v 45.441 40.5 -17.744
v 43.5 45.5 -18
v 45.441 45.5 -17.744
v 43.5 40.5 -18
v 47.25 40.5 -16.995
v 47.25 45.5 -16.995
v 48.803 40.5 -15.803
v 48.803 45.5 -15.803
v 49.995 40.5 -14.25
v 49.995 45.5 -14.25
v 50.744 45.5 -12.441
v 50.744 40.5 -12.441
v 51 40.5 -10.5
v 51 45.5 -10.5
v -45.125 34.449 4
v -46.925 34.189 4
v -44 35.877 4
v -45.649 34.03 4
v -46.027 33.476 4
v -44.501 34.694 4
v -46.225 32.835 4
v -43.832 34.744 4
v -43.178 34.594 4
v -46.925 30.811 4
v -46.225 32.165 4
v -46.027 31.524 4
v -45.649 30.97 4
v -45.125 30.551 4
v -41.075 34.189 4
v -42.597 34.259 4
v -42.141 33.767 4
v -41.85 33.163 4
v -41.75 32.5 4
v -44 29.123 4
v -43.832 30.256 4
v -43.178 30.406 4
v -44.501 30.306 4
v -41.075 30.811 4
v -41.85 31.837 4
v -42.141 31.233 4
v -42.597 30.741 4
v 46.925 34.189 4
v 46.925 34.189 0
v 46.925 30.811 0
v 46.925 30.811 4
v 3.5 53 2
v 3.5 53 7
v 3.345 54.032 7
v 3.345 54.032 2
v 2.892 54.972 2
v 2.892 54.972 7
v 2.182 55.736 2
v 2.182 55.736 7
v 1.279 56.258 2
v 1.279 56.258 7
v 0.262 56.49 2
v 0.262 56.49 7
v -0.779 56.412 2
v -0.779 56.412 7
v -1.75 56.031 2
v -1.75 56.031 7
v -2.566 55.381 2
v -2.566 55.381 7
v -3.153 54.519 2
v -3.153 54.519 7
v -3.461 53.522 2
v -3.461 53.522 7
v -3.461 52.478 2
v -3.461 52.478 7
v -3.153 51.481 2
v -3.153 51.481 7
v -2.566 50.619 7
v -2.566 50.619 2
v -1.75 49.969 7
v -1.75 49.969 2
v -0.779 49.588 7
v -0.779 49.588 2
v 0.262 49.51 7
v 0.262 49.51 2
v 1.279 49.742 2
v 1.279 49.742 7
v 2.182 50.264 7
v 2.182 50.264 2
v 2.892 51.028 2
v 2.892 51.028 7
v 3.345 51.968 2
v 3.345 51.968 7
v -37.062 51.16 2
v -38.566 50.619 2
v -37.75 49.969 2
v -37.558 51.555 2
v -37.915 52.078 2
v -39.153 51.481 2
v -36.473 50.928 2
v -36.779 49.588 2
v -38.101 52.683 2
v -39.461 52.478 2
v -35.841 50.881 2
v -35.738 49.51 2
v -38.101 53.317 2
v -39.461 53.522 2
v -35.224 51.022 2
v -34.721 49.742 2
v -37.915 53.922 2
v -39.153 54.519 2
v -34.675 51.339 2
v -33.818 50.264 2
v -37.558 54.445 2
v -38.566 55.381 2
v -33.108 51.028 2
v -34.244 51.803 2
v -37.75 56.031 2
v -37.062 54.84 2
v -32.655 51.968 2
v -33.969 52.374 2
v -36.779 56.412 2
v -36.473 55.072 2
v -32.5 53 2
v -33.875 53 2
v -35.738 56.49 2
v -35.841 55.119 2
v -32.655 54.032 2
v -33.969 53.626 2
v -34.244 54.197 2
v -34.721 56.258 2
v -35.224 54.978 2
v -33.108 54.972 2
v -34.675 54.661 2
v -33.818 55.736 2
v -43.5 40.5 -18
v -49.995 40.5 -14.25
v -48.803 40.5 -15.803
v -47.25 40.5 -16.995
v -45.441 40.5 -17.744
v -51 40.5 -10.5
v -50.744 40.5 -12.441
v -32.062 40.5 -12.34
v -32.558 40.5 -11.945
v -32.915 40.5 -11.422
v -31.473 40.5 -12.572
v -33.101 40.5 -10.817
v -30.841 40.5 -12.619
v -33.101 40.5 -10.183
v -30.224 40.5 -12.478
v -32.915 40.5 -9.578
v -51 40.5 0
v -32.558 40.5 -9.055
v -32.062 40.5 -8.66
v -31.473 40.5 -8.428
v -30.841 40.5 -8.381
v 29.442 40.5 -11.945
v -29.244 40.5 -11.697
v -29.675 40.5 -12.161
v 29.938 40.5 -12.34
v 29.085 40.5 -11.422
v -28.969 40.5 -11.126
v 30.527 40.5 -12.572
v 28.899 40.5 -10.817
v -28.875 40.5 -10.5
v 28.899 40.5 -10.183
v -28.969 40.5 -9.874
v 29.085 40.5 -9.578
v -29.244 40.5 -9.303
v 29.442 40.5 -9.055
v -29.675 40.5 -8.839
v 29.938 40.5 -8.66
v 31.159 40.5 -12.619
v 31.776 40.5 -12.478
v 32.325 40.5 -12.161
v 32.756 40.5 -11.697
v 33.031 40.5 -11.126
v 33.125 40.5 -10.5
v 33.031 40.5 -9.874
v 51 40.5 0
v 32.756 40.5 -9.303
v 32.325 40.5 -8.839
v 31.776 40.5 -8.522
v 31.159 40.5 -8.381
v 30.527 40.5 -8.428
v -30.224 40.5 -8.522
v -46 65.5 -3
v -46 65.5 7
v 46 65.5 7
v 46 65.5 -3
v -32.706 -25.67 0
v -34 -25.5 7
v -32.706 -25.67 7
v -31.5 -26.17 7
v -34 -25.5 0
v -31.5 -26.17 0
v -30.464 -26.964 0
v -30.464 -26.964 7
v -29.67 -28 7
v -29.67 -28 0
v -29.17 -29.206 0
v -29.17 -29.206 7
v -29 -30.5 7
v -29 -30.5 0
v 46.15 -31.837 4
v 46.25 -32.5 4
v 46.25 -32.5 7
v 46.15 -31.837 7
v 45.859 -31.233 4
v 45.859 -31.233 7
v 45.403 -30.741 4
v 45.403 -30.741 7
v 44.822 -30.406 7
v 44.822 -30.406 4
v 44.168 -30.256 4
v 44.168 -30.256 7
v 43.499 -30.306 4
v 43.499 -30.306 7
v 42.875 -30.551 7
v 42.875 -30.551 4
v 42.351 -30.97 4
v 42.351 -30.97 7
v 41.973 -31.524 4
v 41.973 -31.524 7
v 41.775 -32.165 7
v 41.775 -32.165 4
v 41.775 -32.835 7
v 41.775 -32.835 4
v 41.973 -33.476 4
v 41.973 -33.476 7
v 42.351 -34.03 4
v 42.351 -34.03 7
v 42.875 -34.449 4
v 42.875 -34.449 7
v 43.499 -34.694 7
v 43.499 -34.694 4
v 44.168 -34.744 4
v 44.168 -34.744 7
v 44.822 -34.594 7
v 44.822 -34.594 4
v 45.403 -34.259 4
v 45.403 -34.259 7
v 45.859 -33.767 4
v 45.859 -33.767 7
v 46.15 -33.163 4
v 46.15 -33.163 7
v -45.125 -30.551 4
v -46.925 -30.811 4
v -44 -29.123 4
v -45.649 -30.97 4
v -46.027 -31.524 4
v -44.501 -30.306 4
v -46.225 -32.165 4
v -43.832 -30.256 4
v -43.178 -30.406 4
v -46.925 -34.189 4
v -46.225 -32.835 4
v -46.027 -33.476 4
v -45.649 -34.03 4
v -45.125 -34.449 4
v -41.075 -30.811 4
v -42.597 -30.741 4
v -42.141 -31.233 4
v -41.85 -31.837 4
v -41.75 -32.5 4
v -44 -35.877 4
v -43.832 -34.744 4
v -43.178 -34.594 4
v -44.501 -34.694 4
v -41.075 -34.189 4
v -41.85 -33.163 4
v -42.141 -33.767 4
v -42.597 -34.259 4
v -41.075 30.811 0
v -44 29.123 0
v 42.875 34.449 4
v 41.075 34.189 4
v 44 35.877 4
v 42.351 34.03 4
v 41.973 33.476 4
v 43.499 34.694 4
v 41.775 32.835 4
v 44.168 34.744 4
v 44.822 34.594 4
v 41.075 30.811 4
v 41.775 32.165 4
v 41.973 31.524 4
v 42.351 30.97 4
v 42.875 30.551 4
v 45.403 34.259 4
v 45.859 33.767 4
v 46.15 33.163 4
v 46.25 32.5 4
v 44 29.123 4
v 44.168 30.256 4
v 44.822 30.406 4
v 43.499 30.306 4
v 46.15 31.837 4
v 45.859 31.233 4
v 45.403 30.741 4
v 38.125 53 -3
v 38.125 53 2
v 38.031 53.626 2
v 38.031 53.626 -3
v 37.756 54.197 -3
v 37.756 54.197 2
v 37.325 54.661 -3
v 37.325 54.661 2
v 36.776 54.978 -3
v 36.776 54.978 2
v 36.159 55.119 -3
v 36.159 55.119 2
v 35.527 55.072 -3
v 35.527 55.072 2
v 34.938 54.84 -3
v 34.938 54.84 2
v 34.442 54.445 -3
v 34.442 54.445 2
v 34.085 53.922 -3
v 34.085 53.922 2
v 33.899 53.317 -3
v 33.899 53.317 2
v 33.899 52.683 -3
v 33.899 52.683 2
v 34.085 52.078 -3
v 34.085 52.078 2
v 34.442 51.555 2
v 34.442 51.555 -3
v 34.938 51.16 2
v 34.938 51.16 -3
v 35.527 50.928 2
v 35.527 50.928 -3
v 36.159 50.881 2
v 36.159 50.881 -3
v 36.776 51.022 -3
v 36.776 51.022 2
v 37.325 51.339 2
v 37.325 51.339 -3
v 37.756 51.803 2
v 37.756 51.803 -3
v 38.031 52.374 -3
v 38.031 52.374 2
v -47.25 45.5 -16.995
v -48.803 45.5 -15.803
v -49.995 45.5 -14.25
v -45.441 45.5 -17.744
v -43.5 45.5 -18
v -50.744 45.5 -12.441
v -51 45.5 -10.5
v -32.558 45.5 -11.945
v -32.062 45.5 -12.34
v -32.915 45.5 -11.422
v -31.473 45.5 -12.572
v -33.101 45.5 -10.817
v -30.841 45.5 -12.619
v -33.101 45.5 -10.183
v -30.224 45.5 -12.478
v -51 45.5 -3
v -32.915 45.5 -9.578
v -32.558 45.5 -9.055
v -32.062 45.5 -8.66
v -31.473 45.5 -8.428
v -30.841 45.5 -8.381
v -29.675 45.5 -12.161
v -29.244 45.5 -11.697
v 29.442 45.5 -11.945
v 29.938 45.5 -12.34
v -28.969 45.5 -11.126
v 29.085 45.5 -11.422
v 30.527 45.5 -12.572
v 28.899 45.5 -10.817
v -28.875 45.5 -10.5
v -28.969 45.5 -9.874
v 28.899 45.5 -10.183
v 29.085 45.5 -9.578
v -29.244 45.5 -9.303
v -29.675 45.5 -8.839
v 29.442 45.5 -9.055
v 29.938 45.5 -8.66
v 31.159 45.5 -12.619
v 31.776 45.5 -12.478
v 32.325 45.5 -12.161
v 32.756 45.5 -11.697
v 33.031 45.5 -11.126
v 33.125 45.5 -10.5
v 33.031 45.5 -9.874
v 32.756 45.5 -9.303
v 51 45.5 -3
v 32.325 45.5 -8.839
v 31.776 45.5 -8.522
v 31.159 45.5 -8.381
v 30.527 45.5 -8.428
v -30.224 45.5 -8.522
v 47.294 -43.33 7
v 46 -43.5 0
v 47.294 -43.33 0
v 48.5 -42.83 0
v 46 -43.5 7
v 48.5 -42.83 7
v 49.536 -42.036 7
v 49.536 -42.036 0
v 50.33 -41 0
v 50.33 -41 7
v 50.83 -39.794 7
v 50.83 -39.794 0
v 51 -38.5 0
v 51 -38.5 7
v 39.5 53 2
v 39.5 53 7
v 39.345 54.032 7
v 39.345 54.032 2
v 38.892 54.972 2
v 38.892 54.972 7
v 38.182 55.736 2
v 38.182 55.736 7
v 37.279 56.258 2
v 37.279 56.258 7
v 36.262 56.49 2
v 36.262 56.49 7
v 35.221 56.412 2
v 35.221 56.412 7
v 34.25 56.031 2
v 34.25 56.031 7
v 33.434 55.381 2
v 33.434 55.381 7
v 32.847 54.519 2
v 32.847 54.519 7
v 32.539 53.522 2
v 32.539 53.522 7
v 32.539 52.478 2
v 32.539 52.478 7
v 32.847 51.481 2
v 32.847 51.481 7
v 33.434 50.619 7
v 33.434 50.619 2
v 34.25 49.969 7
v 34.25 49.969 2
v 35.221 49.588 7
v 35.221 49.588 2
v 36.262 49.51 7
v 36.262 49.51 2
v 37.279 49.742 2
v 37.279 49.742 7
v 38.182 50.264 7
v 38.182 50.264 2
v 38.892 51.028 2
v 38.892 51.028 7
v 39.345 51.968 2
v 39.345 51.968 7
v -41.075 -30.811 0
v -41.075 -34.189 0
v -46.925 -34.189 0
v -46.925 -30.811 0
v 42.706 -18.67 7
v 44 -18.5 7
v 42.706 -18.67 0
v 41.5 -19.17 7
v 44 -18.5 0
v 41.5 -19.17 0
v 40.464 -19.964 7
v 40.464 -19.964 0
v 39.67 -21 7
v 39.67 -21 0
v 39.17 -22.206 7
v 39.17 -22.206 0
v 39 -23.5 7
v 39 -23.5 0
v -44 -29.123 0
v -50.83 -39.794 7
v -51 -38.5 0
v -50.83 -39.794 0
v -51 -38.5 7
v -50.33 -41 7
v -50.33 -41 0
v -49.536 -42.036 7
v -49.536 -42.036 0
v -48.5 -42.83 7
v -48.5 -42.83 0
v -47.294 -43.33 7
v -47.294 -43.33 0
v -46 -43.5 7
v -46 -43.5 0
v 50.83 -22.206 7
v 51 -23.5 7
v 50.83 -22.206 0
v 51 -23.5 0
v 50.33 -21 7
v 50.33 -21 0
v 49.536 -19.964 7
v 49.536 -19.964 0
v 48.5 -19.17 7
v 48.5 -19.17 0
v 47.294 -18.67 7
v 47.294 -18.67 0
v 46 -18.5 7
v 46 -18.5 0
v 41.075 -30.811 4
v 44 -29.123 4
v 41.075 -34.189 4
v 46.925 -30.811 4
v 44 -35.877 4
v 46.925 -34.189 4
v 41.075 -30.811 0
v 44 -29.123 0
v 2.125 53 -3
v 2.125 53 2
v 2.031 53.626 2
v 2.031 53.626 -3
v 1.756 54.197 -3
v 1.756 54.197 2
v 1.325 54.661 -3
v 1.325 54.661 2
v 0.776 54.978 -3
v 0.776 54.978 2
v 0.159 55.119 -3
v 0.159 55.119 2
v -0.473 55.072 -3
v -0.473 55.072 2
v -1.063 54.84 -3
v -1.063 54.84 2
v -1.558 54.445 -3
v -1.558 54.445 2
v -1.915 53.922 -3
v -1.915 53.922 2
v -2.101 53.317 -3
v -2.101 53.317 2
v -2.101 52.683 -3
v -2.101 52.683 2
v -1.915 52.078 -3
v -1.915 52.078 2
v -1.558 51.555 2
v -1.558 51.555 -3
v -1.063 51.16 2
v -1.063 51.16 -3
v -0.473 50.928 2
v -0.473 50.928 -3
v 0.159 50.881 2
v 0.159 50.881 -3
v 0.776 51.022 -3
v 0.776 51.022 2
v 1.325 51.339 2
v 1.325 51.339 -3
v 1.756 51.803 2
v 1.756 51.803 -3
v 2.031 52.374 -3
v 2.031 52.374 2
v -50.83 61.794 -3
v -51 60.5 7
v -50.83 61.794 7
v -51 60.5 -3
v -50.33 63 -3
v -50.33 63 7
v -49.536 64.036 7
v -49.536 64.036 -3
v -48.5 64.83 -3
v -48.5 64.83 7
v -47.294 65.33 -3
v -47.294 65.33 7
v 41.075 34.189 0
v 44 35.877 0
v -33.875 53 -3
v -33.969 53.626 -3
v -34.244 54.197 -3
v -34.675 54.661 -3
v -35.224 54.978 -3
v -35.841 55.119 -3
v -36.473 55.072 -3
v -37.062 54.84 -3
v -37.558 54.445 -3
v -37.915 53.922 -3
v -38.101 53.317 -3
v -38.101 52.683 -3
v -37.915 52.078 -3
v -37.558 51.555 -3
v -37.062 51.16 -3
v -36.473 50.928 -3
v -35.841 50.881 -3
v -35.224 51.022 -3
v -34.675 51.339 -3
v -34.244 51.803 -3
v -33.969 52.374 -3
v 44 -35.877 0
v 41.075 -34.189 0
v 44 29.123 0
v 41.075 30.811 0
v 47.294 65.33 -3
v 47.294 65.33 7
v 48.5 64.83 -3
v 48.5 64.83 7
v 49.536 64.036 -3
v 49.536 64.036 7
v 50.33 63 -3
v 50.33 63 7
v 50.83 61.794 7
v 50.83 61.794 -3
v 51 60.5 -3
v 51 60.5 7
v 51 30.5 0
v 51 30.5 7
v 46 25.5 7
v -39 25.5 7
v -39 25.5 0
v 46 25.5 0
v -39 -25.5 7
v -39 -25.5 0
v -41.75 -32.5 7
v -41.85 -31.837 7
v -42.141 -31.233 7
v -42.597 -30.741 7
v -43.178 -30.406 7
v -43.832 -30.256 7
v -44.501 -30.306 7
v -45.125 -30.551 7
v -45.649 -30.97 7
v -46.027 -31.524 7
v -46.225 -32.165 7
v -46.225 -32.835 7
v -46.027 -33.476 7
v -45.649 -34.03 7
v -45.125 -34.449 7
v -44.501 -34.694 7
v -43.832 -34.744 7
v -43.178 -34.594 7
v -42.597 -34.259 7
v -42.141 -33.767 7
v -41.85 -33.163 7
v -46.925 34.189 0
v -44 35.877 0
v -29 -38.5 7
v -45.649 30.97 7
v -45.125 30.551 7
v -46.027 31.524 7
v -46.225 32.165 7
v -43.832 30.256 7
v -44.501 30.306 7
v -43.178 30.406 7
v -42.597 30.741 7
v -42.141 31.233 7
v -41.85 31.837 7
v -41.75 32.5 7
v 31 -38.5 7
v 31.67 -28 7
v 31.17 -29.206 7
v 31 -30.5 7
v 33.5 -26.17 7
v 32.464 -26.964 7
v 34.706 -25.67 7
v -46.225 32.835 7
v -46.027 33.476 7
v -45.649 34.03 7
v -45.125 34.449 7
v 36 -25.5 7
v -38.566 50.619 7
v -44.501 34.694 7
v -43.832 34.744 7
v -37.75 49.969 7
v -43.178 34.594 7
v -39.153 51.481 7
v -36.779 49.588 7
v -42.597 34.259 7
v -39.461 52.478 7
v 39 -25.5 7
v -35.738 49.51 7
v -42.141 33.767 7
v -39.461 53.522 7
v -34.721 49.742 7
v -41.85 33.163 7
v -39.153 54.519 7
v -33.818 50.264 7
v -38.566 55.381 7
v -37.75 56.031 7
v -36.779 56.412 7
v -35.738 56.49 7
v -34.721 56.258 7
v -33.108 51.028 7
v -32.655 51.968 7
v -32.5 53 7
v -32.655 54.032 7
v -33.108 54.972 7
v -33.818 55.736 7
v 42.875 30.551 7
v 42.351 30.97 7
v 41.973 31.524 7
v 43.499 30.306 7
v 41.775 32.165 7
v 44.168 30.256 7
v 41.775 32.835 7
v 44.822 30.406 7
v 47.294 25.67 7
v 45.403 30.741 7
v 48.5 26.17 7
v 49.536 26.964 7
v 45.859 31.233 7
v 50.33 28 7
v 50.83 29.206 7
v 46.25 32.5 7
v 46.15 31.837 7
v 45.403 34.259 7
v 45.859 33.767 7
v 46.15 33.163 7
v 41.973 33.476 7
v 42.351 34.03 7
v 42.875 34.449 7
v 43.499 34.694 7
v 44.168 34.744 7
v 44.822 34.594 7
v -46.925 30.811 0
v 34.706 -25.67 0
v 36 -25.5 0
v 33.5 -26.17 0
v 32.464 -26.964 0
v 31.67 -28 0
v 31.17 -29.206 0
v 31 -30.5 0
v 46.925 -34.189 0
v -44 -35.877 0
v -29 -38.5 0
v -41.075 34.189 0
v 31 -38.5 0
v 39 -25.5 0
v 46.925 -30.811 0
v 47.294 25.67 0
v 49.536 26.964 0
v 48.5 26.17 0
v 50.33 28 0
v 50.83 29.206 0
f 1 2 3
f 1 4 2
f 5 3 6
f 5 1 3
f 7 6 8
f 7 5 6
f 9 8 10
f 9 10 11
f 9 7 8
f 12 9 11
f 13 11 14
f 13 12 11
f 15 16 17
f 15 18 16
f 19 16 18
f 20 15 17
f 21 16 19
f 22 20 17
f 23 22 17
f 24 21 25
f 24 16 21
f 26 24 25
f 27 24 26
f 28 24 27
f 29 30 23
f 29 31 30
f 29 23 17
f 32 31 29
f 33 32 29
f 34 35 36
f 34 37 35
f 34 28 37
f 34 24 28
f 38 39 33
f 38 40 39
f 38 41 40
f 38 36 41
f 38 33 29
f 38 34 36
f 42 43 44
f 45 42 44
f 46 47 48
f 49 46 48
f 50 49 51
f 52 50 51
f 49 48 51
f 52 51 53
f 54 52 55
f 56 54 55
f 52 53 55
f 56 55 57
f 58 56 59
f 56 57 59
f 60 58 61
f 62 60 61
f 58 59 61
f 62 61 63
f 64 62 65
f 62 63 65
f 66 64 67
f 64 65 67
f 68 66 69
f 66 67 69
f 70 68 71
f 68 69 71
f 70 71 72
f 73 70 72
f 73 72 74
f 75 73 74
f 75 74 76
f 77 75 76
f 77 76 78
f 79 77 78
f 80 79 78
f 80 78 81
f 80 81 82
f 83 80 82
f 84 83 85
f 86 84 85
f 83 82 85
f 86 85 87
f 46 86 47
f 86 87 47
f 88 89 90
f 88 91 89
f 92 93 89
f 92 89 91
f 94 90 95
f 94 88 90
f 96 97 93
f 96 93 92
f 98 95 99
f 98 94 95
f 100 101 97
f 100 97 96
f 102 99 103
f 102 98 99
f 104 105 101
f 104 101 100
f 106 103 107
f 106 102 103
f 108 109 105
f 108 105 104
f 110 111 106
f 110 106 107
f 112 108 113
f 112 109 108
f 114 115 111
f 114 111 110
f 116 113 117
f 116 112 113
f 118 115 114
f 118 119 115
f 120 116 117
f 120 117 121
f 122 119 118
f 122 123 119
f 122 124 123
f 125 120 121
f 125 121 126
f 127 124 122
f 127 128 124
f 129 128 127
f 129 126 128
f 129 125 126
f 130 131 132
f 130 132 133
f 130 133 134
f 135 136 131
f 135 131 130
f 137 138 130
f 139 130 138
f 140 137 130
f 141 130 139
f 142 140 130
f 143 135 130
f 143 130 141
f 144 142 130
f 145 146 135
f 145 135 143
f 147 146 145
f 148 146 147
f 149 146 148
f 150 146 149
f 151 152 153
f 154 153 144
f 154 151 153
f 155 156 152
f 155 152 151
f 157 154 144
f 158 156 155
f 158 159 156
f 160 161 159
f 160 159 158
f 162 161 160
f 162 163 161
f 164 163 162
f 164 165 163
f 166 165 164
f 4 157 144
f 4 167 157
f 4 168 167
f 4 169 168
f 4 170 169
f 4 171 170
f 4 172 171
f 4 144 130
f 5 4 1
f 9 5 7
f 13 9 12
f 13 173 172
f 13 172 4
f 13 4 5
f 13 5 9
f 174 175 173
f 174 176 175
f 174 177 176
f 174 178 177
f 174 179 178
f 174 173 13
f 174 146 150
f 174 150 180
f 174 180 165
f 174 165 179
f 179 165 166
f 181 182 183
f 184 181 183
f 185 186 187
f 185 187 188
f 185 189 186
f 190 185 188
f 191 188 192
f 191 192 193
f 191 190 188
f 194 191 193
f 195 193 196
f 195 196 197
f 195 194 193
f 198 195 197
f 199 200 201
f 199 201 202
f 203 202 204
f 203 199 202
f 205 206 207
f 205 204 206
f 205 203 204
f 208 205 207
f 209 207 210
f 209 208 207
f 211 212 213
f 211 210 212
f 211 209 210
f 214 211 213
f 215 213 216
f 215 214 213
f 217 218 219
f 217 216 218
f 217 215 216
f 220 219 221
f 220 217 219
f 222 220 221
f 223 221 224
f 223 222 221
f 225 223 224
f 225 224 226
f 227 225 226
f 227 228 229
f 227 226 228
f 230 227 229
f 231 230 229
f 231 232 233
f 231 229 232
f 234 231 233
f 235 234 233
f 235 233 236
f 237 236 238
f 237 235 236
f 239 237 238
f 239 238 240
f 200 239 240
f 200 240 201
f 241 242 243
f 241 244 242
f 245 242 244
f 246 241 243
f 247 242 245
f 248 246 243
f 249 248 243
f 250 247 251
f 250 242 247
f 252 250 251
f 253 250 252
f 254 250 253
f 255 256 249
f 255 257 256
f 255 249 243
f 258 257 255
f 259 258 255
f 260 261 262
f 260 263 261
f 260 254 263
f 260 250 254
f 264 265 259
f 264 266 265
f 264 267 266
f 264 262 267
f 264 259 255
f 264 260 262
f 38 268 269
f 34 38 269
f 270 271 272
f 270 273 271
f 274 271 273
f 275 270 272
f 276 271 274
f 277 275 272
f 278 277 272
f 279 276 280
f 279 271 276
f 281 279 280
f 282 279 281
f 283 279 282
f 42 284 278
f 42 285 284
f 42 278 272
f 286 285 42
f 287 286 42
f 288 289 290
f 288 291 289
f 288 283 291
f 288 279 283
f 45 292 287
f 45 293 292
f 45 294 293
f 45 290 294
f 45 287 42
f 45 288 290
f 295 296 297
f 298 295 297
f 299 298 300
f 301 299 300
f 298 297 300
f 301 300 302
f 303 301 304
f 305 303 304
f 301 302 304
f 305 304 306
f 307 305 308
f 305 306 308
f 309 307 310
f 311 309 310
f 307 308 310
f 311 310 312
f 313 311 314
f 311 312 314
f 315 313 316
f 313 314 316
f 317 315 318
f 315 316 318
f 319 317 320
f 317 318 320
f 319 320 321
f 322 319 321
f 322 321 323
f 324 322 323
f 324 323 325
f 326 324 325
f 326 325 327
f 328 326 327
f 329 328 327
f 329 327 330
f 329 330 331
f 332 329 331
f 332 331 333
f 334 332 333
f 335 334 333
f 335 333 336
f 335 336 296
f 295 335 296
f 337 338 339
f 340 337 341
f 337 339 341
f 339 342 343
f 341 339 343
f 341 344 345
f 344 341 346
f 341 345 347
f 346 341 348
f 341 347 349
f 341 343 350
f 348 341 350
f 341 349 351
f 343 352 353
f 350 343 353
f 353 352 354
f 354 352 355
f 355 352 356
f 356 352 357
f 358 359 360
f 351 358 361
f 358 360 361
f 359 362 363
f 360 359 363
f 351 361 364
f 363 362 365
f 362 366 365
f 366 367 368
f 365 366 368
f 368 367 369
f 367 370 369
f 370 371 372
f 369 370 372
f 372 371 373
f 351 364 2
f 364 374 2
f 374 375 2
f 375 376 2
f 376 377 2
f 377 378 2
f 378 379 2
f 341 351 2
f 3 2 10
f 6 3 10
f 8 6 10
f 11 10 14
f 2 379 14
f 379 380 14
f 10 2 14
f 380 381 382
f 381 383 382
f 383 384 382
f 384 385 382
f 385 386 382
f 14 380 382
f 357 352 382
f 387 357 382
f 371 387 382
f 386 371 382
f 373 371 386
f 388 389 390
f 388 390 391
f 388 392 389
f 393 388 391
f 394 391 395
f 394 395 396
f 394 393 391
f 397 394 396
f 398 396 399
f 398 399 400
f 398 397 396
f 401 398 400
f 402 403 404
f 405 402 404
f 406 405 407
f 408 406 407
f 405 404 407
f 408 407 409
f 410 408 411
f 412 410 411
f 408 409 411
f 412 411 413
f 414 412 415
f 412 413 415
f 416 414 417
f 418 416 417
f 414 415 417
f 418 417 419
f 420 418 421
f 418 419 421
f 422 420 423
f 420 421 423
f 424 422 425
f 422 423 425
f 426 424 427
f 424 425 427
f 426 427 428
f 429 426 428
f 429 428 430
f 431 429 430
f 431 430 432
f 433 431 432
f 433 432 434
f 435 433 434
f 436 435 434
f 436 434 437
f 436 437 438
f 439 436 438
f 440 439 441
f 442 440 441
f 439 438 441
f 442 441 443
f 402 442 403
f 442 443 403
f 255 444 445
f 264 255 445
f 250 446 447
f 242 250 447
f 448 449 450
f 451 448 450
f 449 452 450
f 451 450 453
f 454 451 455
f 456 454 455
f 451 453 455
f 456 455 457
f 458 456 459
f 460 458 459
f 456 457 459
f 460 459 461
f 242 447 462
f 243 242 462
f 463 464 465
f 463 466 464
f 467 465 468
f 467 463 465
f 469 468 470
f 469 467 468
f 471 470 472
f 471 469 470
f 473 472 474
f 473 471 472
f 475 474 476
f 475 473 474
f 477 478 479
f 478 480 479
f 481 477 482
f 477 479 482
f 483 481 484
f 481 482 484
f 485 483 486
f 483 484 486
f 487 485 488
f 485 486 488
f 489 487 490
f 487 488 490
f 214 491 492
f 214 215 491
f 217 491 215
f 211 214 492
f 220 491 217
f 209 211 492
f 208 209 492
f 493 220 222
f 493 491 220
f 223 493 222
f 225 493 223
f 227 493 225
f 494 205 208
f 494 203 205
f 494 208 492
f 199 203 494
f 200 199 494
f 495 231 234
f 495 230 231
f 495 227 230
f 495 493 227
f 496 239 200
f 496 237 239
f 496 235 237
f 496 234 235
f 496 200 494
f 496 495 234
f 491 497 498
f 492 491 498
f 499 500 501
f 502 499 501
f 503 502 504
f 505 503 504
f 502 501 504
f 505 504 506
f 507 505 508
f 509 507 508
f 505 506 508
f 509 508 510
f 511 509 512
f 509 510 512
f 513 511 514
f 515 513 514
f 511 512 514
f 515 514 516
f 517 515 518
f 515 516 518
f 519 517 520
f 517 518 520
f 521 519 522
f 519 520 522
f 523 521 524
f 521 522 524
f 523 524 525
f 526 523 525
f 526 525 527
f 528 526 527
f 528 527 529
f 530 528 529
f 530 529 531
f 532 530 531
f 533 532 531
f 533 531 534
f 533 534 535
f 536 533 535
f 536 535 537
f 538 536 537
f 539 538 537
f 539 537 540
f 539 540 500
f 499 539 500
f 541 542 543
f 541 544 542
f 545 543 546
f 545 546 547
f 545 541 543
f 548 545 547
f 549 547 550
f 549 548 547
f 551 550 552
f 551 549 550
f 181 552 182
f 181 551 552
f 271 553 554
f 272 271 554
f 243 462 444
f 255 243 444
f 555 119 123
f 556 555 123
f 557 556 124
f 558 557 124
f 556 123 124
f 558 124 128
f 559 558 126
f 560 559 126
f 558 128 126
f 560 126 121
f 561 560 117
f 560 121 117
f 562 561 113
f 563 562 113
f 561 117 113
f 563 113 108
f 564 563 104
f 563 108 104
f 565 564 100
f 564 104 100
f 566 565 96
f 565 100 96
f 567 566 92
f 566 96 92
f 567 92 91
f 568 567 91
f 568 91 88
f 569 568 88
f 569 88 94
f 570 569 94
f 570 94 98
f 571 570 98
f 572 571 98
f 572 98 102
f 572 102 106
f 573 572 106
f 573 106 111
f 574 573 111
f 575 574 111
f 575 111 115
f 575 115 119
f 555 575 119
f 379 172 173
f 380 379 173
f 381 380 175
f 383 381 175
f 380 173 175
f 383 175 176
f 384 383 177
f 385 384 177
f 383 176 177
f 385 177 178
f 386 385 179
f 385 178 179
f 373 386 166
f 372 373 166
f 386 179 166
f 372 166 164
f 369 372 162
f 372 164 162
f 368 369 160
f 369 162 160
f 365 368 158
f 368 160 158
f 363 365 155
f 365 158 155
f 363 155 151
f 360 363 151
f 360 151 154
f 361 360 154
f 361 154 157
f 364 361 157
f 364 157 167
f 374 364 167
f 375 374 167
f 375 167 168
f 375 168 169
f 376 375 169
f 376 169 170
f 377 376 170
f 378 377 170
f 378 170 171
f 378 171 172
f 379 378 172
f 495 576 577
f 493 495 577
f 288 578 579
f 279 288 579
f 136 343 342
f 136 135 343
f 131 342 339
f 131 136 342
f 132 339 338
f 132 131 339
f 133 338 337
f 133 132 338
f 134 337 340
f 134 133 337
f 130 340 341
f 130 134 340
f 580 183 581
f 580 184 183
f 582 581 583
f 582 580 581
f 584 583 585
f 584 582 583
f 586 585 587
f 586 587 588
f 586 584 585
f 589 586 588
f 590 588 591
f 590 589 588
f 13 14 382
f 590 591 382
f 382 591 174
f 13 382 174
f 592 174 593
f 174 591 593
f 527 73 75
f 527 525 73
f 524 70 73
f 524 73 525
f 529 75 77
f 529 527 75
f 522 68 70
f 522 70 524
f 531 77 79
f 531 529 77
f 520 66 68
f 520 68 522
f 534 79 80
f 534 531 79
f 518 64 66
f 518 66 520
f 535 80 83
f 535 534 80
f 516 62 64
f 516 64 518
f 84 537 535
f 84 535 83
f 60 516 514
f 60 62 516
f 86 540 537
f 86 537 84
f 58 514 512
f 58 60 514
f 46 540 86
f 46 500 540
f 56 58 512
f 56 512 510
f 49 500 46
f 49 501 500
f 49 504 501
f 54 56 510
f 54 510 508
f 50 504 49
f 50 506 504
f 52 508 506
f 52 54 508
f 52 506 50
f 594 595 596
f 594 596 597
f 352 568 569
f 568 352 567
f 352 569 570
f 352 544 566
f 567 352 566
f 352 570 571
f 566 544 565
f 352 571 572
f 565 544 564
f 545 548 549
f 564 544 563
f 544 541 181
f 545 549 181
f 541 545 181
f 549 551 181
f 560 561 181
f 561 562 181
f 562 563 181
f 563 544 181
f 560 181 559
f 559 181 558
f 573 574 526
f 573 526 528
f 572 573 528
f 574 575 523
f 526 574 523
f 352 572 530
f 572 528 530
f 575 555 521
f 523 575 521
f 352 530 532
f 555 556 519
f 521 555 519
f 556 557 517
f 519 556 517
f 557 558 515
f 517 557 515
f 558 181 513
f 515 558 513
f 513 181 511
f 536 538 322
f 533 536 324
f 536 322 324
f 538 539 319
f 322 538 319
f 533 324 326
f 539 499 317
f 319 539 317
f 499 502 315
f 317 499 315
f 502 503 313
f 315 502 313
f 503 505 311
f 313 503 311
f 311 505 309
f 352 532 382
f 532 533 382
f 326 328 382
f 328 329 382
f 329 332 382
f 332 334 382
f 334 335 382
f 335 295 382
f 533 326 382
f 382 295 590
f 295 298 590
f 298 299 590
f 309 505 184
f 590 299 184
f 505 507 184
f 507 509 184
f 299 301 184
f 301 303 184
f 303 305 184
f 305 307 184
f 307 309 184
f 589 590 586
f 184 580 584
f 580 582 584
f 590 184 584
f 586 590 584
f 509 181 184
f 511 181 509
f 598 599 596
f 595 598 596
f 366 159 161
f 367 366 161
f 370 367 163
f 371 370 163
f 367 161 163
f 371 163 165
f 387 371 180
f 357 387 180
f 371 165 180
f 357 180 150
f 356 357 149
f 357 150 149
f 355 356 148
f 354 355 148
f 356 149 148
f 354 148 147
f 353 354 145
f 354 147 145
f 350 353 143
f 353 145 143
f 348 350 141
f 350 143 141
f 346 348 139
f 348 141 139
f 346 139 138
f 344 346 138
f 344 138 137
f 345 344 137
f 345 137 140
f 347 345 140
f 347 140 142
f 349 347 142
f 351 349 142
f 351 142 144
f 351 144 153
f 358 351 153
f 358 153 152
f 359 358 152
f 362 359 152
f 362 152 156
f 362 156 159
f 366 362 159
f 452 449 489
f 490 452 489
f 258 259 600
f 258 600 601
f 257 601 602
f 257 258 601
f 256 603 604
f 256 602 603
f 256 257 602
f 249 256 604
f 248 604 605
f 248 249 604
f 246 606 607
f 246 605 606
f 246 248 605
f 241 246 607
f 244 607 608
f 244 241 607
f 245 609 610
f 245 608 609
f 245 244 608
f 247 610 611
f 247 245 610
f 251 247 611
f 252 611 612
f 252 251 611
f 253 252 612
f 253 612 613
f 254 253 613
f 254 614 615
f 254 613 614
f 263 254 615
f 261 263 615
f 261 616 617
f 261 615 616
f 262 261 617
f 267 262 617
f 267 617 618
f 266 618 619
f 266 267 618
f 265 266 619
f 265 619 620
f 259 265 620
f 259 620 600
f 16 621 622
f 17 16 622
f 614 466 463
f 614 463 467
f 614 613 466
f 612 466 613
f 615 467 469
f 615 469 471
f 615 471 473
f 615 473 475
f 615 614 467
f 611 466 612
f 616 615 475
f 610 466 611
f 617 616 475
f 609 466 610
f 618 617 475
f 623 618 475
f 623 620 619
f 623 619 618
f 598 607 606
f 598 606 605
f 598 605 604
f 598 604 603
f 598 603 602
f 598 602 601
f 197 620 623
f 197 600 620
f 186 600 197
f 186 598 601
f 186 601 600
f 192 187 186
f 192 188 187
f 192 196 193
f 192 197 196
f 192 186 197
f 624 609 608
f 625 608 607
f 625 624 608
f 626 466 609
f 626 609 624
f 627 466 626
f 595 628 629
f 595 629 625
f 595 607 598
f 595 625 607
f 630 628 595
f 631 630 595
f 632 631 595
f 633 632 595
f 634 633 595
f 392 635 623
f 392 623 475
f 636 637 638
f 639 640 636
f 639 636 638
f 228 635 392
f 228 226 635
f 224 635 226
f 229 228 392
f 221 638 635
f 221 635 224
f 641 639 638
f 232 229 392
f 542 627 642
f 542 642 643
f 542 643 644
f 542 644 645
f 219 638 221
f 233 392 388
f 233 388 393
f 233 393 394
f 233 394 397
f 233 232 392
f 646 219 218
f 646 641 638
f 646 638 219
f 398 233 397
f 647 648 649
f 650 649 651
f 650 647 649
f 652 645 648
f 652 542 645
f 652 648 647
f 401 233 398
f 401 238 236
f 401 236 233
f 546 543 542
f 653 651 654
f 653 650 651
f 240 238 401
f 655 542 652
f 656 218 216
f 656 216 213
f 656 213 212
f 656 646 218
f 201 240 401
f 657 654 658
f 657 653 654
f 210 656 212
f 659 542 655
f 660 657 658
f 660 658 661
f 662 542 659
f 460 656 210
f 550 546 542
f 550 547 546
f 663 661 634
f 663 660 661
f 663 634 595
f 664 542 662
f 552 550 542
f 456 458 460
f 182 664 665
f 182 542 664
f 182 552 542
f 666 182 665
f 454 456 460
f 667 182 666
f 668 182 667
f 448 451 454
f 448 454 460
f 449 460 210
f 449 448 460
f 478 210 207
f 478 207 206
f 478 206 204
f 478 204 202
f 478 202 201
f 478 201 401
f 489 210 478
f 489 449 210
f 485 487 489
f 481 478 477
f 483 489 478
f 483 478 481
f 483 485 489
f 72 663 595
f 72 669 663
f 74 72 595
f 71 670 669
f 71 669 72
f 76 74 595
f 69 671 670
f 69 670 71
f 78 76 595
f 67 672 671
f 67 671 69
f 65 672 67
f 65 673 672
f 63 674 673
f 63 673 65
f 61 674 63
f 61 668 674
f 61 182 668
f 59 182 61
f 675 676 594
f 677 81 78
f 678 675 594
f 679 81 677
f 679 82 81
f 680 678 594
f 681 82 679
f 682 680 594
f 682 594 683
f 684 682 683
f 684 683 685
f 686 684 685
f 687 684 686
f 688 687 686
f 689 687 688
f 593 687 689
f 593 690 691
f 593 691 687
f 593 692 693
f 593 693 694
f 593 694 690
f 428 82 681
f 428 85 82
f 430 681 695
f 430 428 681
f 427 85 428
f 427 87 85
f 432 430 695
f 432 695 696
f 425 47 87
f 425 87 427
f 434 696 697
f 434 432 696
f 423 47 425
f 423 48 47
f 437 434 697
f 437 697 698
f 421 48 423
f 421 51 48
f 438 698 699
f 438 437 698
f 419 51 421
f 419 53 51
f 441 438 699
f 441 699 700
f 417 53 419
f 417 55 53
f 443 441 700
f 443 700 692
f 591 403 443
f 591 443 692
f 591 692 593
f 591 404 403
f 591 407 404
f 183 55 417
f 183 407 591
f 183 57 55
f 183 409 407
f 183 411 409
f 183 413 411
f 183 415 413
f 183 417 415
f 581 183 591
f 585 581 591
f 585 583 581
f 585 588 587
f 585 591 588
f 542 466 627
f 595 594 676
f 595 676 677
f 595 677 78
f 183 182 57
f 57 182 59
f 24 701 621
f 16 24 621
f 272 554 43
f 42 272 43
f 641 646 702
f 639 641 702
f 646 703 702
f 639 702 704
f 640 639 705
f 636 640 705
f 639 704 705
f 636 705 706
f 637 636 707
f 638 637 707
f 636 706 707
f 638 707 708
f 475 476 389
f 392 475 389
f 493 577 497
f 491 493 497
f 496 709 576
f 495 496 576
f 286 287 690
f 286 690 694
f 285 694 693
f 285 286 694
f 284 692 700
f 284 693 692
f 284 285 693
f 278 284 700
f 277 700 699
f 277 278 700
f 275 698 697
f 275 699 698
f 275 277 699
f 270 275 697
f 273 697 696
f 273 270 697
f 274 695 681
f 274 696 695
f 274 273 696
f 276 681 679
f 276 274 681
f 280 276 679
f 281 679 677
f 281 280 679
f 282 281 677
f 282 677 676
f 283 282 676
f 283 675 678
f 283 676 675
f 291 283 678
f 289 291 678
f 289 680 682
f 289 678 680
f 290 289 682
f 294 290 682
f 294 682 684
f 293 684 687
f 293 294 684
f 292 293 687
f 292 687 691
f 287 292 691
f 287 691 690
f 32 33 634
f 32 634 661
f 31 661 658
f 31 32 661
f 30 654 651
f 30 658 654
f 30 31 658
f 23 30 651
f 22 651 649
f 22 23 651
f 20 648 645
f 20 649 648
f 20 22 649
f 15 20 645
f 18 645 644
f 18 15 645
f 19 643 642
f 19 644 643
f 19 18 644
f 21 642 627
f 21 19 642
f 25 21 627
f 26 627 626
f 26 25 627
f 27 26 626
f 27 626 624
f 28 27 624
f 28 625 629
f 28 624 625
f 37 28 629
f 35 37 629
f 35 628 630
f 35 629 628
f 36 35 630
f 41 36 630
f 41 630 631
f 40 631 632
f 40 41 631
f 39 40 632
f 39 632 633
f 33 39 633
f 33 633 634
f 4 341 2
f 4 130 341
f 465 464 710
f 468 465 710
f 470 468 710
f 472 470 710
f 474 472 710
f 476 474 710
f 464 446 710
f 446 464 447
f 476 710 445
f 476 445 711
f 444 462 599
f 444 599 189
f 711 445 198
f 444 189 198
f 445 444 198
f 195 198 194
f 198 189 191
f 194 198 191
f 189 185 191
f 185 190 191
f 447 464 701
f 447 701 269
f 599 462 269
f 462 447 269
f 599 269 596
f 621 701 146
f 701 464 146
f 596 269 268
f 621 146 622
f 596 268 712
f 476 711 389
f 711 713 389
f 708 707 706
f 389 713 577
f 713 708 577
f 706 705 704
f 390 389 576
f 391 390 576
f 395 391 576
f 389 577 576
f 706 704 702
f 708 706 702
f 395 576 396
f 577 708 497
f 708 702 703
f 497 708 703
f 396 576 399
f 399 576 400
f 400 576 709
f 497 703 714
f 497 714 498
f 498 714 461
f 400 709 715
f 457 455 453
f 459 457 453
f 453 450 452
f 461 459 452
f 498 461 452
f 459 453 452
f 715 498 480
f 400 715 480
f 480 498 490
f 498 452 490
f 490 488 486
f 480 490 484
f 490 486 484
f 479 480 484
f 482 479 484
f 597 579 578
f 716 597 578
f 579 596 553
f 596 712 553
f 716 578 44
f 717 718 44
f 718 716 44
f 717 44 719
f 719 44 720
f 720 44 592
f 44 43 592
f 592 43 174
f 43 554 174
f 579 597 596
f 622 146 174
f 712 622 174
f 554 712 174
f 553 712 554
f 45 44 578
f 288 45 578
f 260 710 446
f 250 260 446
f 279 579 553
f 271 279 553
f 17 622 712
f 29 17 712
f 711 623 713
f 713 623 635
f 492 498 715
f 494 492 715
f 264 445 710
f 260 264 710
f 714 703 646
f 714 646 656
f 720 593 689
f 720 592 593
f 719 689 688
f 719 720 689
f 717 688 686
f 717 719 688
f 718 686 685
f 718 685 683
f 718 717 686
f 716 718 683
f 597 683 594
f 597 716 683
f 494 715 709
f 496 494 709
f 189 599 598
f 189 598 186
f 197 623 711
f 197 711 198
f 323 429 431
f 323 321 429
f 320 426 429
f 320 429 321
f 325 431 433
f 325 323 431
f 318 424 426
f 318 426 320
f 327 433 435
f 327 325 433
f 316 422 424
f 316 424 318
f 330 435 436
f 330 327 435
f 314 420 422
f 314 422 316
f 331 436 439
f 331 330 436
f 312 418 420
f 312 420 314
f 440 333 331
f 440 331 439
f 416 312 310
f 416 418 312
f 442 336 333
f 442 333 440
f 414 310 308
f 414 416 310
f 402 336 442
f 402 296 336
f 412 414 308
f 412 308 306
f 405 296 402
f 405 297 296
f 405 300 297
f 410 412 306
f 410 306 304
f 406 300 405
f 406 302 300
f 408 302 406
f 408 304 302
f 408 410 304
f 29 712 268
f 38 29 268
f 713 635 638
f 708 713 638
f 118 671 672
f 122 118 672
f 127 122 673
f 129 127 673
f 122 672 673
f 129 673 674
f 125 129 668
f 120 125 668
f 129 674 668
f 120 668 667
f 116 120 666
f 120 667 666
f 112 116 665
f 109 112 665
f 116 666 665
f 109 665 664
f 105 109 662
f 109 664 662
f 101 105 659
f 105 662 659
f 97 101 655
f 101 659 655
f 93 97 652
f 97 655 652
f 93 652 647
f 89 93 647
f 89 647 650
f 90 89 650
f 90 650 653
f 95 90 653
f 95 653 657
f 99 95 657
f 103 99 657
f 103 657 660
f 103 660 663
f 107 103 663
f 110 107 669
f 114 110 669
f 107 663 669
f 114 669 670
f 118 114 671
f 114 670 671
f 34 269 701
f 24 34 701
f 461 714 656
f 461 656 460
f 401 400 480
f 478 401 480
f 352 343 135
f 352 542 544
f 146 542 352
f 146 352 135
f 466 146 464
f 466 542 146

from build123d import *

# Parameters (mm, degrees)
F0_W      = 102
F0_H      = 84
F0_R      = 2.25
F0_W_2    = 78
F0_H_2    = 51
F1_DEPTH  = 15
F3_DEPTH  = 4
F4_W      = 12
F4_H      = 44
F4_W_2    = 60
F4_H_2    = 13
F5_DEPTH  = 15.001
F6_W      = 102
F6_H      = 84
F7_DEPTH  = 8
F8_W      = 102
F8_H      = 25
F8_R      = 2.125
F9_DEPTH  = 10
F10_R     = 3.5
F11_DEPTH = 5
F12_R     = 5
F13_W     = 102
F13_H     = 5
F14_DEPTH = 15
F15_R     = 2.125
F16_DEPTH = 25
F17_R     = 7.5


with BuildPart() as f1:
    # F0 (on Top) → F1 (new body)
    with BuildSketch(Plane.XY):
        with Locations((0, -1.5)):
            Rectangle(F0_W, F0_H)
        with Locations((-44, -32.5)):
            Circle(F0_R, mode=Mode.SUBTRACT)
        with Locations((44, -32.5)):
            Circle(F0_R, mode=Mode.SUBTRACT)
        with Locations((-44, 32.5)):
            Circle(F0_R, mode=Mode.SUBTRACT)
        Rectangle(F0_W_2, F0_H_2, mode=Mode.SUBTRACT)
        with Locations((44, 32.5)):
            Circle(F0_R, mode=Mode.SUBTRACT)
    extrude(amount=F1_DEPTH)

    # F2 (on face) → F3 (cut)
    with BuildSketch(Plane(origin=(0, 0, 0), x_dir=(1, 0, 0), z_dir=(0, 0, -1))):
        Polygon((-41.075, 30.8112504626), (-41.075, 34.1887495374), (-44, 35.8774990748), (-46.925, 34.1887495374), (-46.925, 30.8112504626), (-44, 29.1225009252), align=None)
        Polygon((41.075, 34.1887495374), (41.075, 30.8112504626), (44, 29.1225009252), (46.925, 30.8112504626), (46.925, 34.1887495374), (44, 35.8774990748), align=None)
        Polygon((41.075, -30.8112504626), (41.075, -34.1887495374), (44, -35.8774990748), (46.925, -34.1887495374), (46.925, -30.8112504626), (44, -29.1225009252), align=None)
        Polygon((-41.075, -34.1887495374), (-41.075, -30.8112504626), (-44, -29.1225009252), (-46.925, -30.8112504626), (-46.925, -34.1887495374), (-44, -35.8774990748), align=None)
    extrude(amount=-F3_DEPTH, mode=Mode.SUBTRACT)

    # F4 (on face) → F5 (cut, through all)
    with BuildSketch(Plane.XY.offset(15)):
        with Locations((45, 3.5)):
            Rectangle(F4_W, F4_H)
        with Locations((1, -32)):
            Rectangle(F4_W_2, F4_H_2)
    extrude(amount=-F5_DEPTH, mode=Mode.SUBTRACT)

    # F6 (on face) → F7 (cut)
    with BuildSketch(Plane.XY.offset(15)):
        with Locations((0, -1.5)):
            Rectangle(F6_W, F6_H)
    extrude(amount=-F7_DEPTH, mode=Mode.SUBTRACT)

    # F8 (on face) → F9 (join)
    with BuildSketch(Plane.XY.offset(7)):
        with Locations((0, 53)):
            Rectangle(F8_W, F8_H)
        with Locations((-36, 53)):
            Circle(F8_R, mode=Mode.SUBTRACT)
        with Locations((0, 53)):
            Circle(F8_R, mode=Mode.SUBTRACT)
        with Locations((36, 53)):
            Circle(F8_R, mode=Mode.SUBTRACT)
    extrude(amount=-F9_DEPTH)

    # F10 (on face) → F11 (cut)
    with BuildSketch(Plane.XY.offset(7)):
        with Locations((36, 53)):
            Circle(F10_R)
        with Locations((0, 53)):
            Circle(F10_R)
        with Locations((-36, 53)):
            Circle(F10_R)
    extrude(amount=-F11_DEPTH, mode=Mode.SUBTRACT)

    # F12
    f12_edges = [f1.edges().sort_by_distance(p)[0] for p in [
        (-51, -43.5, 3.5),
        (51, -43.5, 3.5),
        (51, 25.5, 3.5),
        (51, -18.5, 3.5),
        (39, -18.5, 3.5),
        (31, -25.5, 3.5),
        (-29, -25.5, 3.5),
        (-51, 65.5, 2),
        (51, 65.5, 2),
    ]]
    fillet(f12_edges, radius=F12_R)

    # F13 (on face) → F14 (join)
    with BuildSketch(Plane(origin=(0, 0, -3), x_dir=(1, 0, 0), z_dir=(0, 0, -1))):
        with Locations((0, -43)):
            Rectangle(F13_W, F13_H)
    extrude(amount=F14_DEPTH)

    # F15 (on face) → F16 (cut)
    with BuildSketch(Plane.XZ.offset(-40.5)):
        with Locations((-31, -10.5)):
            Circle(F15_R)
        with Locations((31, -10.5)):
            Circle(F15_R)
    extrude(amount=-F16_DEPTH, mode=Mode.SUBTRACT)

    # F17
    f17_edges = [f1.edges().sort_by_distance(p)[0] for p in [
        (-51, 43, -18),
        (51, 43, -18),
    ]]
    fillet(f17_edges, radius=F17_R)


solid = f1.part
